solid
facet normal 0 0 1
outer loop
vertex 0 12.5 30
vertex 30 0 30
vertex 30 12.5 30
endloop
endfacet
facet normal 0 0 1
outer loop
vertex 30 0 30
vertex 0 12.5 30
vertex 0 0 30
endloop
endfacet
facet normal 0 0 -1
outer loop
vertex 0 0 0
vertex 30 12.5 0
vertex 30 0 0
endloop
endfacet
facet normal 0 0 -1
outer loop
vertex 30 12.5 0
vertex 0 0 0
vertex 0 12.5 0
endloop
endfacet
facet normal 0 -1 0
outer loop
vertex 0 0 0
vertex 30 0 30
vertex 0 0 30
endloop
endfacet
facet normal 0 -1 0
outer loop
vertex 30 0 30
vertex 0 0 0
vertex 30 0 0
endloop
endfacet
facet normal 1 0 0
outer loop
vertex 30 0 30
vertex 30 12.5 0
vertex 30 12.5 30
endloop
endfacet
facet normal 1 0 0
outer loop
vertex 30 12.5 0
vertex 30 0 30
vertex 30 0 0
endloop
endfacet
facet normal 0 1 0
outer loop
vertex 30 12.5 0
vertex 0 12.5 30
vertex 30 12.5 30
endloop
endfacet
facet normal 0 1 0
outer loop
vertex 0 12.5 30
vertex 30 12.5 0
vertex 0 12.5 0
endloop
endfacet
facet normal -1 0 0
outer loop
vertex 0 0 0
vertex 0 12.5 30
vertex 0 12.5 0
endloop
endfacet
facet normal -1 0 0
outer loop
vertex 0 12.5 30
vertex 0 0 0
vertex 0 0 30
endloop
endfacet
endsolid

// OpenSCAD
// Generated by generate_scads.py
scale([1.0,0.5,1.5]) {
  cube(size=[30,25,20], center=false);
}
